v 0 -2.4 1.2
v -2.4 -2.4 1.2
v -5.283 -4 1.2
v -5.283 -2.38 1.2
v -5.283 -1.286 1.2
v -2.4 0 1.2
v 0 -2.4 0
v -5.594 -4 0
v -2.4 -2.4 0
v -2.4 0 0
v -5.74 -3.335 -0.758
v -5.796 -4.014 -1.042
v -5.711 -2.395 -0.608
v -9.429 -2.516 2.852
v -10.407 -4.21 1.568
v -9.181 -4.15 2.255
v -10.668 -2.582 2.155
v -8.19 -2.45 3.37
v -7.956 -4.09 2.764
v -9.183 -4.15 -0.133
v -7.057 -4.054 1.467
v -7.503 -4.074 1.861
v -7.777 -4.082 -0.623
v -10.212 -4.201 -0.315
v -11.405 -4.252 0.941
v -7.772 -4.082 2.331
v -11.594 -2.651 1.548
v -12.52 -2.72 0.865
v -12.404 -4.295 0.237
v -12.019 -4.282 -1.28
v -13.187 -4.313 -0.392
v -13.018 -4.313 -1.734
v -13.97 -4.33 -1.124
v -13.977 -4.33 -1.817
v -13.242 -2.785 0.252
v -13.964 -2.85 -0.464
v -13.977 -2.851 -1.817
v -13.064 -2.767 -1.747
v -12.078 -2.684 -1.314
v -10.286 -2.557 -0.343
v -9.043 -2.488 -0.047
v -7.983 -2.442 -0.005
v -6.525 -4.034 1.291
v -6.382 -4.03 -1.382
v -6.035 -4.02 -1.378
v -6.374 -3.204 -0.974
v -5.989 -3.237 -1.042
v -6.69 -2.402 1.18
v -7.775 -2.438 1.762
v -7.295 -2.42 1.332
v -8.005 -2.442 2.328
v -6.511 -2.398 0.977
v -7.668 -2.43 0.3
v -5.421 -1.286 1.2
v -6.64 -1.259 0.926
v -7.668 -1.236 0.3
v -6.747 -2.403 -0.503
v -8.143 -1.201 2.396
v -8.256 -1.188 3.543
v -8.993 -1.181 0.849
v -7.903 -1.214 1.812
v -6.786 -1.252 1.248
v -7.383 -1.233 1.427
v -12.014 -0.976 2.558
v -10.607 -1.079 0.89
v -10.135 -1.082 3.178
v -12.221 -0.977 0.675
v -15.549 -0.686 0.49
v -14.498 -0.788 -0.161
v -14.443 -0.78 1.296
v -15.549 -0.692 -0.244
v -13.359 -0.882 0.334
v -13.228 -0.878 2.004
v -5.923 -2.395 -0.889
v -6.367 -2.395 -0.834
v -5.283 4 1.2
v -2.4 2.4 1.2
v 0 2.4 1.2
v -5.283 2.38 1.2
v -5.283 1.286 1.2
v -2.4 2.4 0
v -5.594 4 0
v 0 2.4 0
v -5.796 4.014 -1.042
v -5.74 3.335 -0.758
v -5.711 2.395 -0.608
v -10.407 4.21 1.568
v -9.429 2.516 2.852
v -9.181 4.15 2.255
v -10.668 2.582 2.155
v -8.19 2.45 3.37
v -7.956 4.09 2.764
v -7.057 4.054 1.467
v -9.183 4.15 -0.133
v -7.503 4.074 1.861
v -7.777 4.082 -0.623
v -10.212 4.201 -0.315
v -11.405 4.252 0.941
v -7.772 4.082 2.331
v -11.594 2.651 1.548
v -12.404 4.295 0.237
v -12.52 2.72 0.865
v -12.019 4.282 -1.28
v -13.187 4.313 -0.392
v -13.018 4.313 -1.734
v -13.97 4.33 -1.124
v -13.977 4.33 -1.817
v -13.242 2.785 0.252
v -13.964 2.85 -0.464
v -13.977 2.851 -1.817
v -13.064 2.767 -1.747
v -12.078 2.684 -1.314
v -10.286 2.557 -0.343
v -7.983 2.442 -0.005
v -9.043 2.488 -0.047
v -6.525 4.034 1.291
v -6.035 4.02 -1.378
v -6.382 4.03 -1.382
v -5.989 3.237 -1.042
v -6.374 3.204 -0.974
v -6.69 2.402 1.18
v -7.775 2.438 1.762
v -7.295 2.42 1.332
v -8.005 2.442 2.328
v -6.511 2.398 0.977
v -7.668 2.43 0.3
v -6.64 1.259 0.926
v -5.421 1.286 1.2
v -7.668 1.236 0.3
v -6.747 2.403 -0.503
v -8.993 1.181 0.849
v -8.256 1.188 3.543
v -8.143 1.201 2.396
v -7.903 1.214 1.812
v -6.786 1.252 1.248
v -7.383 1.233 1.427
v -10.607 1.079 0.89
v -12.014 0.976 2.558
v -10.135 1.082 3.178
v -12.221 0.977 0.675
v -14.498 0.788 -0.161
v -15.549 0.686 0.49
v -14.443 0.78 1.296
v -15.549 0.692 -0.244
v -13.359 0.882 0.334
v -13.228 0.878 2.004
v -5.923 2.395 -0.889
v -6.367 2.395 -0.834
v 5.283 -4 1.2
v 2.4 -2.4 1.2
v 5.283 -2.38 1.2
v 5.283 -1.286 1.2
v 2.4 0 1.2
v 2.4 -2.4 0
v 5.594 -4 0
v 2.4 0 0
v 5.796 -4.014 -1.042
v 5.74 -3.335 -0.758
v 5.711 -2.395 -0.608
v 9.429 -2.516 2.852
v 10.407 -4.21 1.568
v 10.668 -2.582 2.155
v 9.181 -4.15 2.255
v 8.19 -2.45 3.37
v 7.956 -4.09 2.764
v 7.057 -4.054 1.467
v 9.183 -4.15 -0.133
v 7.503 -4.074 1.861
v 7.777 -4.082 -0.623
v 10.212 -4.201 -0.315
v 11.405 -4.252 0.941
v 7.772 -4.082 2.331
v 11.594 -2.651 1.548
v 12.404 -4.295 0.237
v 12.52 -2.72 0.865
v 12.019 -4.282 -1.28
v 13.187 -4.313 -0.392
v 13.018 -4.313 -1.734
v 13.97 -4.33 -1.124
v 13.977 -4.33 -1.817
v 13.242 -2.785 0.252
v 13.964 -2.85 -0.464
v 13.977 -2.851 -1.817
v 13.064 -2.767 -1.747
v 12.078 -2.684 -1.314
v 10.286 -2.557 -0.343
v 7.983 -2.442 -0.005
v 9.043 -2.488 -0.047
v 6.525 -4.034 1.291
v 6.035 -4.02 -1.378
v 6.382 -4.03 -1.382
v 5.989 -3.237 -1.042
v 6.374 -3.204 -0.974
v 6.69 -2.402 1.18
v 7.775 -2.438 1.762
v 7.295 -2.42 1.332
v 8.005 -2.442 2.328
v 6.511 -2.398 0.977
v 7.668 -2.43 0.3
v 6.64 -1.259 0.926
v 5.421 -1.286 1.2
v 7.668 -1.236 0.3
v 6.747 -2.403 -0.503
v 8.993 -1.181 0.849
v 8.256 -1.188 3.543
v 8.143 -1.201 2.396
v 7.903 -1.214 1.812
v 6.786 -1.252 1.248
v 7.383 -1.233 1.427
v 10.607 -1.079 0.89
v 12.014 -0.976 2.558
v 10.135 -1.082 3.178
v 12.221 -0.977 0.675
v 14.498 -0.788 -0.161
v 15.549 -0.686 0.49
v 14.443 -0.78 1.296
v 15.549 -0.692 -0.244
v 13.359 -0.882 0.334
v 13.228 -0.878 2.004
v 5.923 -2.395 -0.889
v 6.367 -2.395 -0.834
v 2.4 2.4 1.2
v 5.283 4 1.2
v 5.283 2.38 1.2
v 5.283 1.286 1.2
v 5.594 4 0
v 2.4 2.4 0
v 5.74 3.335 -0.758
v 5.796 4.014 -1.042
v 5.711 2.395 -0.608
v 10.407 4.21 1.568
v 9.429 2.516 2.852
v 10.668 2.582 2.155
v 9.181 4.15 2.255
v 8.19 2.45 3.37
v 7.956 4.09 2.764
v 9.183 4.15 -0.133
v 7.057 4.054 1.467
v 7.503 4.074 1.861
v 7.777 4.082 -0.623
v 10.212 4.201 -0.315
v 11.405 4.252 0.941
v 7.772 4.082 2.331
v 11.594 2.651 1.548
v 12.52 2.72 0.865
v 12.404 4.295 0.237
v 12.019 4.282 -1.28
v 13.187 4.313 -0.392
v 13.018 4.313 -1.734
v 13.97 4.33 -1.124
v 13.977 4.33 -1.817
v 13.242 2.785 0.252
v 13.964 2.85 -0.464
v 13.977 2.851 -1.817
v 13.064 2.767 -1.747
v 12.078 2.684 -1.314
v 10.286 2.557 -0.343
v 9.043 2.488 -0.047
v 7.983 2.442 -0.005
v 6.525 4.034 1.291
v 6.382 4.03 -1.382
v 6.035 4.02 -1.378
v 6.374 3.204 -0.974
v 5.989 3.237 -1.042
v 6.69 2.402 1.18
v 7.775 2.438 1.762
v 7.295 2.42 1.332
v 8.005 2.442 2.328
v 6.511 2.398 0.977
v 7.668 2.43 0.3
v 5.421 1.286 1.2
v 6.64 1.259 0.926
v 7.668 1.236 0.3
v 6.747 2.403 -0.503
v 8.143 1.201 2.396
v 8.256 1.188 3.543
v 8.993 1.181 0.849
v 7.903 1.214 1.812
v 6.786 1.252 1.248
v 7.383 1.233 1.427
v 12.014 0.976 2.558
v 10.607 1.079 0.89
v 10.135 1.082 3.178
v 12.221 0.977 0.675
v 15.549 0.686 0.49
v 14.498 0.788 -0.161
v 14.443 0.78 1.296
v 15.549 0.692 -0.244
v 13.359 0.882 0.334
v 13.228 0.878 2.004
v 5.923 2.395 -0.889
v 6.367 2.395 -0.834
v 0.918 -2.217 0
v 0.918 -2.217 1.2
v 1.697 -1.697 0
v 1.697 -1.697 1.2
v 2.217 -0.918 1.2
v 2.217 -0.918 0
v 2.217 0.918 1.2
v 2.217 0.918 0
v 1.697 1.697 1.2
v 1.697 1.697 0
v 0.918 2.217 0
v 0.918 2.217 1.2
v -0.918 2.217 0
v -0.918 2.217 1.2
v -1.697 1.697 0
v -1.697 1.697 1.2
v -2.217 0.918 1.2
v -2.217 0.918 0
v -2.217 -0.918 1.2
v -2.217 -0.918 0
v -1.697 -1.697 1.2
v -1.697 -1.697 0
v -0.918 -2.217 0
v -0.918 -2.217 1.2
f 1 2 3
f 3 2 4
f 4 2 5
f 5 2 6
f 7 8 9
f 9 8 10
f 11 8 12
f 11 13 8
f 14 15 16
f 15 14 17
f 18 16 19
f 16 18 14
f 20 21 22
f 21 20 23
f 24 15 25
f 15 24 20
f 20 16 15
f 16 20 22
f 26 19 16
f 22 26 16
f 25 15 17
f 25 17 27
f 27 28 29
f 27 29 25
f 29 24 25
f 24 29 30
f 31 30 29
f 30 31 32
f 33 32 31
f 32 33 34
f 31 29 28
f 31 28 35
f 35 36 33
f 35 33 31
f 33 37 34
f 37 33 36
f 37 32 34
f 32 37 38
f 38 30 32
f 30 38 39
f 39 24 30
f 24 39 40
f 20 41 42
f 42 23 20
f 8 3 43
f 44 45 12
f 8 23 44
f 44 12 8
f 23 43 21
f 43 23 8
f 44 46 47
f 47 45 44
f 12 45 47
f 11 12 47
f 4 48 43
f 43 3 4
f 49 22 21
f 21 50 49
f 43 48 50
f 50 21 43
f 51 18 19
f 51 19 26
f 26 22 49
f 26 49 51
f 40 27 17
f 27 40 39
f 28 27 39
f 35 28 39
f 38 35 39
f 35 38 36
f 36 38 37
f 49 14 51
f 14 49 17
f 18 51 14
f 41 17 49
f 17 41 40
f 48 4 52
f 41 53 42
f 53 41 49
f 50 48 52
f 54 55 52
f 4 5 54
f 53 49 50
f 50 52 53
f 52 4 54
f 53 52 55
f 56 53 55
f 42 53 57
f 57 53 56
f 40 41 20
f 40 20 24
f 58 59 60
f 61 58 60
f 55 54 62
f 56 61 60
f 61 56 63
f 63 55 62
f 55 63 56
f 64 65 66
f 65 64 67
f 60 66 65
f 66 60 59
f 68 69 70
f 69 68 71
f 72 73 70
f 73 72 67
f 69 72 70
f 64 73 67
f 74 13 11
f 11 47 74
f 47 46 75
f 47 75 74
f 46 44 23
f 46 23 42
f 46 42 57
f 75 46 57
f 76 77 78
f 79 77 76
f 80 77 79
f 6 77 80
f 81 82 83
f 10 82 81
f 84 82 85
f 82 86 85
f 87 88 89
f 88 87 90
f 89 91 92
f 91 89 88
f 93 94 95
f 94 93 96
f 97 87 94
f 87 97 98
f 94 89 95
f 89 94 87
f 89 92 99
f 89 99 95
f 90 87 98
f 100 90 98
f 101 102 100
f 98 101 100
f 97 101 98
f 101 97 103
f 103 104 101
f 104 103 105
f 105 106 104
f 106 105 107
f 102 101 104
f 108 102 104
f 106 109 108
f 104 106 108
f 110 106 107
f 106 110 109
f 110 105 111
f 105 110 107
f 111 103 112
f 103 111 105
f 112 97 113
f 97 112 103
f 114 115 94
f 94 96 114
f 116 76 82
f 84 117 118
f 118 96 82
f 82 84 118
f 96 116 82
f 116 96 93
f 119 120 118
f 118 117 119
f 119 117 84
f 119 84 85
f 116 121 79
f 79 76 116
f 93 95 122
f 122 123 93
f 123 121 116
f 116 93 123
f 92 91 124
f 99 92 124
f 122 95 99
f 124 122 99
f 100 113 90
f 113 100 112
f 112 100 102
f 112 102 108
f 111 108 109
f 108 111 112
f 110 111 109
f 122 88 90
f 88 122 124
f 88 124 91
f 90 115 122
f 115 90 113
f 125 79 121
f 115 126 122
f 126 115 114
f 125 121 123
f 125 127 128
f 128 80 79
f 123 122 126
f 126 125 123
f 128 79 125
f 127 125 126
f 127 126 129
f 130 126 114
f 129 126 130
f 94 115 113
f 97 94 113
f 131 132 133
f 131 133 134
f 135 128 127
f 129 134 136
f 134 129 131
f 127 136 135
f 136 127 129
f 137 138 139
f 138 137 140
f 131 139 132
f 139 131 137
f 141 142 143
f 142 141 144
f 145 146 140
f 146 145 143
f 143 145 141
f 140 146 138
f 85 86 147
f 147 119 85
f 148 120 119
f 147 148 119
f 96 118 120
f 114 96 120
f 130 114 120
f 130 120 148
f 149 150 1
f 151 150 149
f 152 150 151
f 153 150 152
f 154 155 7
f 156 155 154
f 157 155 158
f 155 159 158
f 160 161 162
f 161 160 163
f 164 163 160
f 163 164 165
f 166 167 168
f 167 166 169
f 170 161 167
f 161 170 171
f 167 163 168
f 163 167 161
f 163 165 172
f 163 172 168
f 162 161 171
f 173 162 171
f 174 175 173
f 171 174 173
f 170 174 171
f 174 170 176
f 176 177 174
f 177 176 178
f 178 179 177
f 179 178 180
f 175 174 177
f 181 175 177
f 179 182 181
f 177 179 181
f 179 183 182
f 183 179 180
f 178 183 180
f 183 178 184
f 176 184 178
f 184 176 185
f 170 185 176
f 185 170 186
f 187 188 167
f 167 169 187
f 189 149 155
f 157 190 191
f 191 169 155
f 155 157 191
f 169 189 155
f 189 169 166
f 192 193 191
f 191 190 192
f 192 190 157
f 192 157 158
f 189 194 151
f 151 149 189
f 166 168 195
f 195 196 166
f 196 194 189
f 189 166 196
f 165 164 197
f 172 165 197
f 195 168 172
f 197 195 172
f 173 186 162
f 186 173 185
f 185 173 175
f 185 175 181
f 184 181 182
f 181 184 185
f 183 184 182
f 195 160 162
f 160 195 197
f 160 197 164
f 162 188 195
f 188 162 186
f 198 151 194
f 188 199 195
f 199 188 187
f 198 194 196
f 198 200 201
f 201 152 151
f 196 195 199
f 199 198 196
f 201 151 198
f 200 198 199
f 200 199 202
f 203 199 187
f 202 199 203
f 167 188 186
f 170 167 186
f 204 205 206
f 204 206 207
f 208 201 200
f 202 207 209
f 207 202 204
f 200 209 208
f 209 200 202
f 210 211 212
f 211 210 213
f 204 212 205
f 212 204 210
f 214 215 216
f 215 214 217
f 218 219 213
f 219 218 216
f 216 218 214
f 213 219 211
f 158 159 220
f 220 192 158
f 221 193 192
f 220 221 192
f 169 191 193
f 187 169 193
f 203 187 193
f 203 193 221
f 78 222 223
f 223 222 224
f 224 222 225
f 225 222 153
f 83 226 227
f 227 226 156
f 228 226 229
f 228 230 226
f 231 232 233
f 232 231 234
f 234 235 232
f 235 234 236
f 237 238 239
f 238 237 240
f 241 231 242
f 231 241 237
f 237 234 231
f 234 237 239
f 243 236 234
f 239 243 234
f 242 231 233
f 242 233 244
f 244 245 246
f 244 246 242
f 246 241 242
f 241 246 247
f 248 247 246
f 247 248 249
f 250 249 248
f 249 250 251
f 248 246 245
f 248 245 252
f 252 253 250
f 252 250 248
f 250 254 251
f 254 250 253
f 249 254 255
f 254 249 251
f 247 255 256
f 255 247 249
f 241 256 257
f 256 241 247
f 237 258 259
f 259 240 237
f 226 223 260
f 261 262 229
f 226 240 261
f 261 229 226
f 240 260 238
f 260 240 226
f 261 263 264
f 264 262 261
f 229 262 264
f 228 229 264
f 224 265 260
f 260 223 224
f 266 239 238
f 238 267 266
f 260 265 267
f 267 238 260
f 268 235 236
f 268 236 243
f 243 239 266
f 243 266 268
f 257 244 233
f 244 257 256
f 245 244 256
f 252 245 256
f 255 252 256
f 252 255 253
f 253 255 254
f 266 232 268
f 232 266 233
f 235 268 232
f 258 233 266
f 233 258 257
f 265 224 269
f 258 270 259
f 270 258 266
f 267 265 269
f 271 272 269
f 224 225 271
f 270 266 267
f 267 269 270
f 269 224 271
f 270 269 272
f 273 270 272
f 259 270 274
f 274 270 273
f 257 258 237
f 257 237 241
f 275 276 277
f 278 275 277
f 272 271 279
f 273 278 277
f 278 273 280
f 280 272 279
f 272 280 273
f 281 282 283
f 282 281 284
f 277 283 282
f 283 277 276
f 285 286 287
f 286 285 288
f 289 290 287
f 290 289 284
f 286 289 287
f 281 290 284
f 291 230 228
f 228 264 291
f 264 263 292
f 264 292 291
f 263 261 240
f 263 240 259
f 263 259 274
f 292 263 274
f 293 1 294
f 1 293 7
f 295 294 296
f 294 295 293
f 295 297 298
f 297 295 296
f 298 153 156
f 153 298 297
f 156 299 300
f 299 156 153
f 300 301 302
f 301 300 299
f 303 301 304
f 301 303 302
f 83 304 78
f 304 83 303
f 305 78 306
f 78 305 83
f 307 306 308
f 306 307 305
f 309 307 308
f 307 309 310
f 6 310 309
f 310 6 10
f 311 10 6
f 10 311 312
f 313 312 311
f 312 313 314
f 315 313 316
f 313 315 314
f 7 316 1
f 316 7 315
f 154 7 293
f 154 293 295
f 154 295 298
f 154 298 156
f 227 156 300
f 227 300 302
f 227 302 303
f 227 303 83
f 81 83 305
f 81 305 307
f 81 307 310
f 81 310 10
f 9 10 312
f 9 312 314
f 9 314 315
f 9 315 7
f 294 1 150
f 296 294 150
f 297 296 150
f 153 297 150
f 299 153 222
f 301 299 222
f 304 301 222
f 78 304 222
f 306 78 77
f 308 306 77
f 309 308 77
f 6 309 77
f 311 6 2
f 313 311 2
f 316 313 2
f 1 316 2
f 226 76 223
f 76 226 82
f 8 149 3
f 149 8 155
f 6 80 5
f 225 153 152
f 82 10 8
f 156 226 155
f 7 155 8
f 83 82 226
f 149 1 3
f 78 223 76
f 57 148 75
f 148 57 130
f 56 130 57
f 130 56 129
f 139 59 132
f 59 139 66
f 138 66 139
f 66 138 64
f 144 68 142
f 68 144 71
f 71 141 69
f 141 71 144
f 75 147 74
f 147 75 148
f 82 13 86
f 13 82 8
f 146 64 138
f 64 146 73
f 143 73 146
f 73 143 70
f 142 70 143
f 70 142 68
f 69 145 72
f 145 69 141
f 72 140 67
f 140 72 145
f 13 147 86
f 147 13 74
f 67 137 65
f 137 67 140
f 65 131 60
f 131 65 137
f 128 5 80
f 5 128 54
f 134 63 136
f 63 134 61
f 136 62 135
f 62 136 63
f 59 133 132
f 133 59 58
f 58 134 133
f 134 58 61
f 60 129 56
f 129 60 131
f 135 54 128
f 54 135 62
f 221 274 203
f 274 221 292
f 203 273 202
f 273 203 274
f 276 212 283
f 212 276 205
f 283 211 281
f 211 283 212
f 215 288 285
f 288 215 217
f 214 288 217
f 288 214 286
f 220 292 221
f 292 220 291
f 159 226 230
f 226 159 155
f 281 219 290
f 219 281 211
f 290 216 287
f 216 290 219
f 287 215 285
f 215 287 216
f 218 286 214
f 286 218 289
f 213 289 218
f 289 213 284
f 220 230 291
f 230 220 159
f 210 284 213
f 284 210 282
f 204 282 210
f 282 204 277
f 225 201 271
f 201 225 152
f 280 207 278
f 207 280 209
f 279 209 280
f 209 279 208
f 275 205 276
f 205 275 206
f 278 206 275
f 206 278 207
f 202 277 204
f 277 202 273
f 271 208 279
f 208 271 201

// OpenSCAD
use <../lib.scad>
use <../p/4-4cylo.scad>
use <../p/4-4ndis.scad>
use <../p/recte4.scad>
use <s/12618s01.scad>
$fa=1; $fs=0.2;
function ldraw_lib__12618(realsolid=false) = [
// 0 Minifig Armour Shoulder Pads with Six Spikes
// 0 Name: 12618.dat
// 0 Author: Gerald Lasser [GeraldLasser]
// 0 !LDRAW_ORG Part UPDATE 2023-01
// 0 !LICENSE Licensed under CC BY 2.0 and CC BY 4.0 : see CAreadme.txt
// 
// 0 BFC CERTIFY CCW
  [0,"BFC","CERTIFY"],
  [0,"BFC","CCW"],
// 
// 0 !CATEGORY Minifig Neckwear
// 
// 0 !HISTORY 2013-08-14 {LEGO Digital Designer} Original part shape
// 0 !HISTORY 2020-04-29 [GeraldLasser] File preparation for LDraw Parts Tracker
// 0 !HISTORY 2023-03-05 [OrionP] Official Update 2023-01
// 
// 
// 1 16 0 0 0 1 0 0 0 1 0 0 0 1 s\12618s01.dat
  [1,16,0,0,0,1,0,0,0,1,0,0,0,1, ldraw_lib__s__12618s01(realsolid)],
// 1 16 0 0 0 1 0 0 0 1 0 0 0 -1 s\12618s01.dat
  [1,16,0,0,0,1,0,0,0,1,0,0,0,-1, ldraw_lib__s__12618s01(realsolid)],
// 1 16 0 0 0 -1 0 0 0 1 0 0 0 1 s\12618s01.dat
  [1,16,0,0,0,-1,0,0,0,1,0,0,0,1, ldraw_lib__s__12618s01(realsolid)],
// 1 16 0 0 0 -1 0 0 0 1 0 0 0 -1 s\12618s01.dat
  [1,16,0,0,0,-1,0,0,0,1,0,0,0,-1, ldraw_lib__s__12618s01(realsolid)],
// 
// 0 // Neck
// 0 BFC INVERTNEXT
  [0,"BFC","INVERTNEXT"],
// 1 16 0 0 0 0 0 6 0 -3 0 -6 0 0 4-4cylo.dat
  [1,16,0,0,0,0,0,6,0,-3,0,-6,0,0, ldraw_lib__4_4cylo(realsolid)],
// 1 16 0 0 0 0 0 6 0 -1 0 -6 0 0 4-4ndis.dat
  [1,16,0,0,0,0,0,6,0,-1,0,-6,0,0, ldraw_lib__4_4ndis(realsolid)],
// 1 16 0 -3 0 0 0 6 0 1 0 -6 0 0 4-4ndis.dat
  [1,16,0,-3,0,0,0,6,0,1,0,-6,0,0, ldraw_lib__4_4ndis(realsolid)],
// 
// 1 16 0 0 0 0 0 13.985 0 -1 0 10 0 0 recte4.dat
  [1,16,0,0,0,0,0,13.985,0,-1,0,10,0,0, ldraw_lib__recte4(realsolid)],
// 4 16 -13.985 0 10 -13.207 -3 10 13.207 -3 10 13.985 0 10
  [4,16,-13.985,0,10,-13.207,-3,10,13.207,-3,10,13.985,0,10],
// 4 16 -13.207 -3 -10 -13.985 0 -10 13.985 0 -10 13.207 -3 -10
  [4,16,-13.207,-3,-10,-13.985,0,-10,13.985,0,-10,13.207,-3,-10],
// 2 24 -13.207 -3 10 13.207 -3 10
  [2,24,-13.207,-3,10,13.207,-3,10],
// 2 24 -13.207 -3 -10 13.207 -3 -10
  [2,24,-13.207,-3,-10,13.207,-3,-10],
// 3 16 -6 -3 0 -13.207 -3 3.216 -13.207 -3 -3.216
  [3,16,-6,-3,0,-13.207,-3,3.216,-13.207,-3,-3.216],
// 3 16 13.207 -3 3.216 6 -3 0 13.207 -3 -3.216
  [3,16,13.207,-3,3.216,6,-3,0,13.207,-3,-3.216],
// 3 16 -13.985 0 10 -6 0 0 -13.985 0 -10
  [3,16,-13.985,0,10,-6,0,0,-13.985,0,-10],
// 3 16 6 0 0 13.985 0 10 13.985 0 -10
  [3,16,6,0,0,13.985,0,10,13.985,0,-10],
// 3 16 0 0 -6 13.985 0 -10 -13.985 0 -10
  [3,16,0,0,-6,13.985,0,-10,-13.985,0,-10],
// 3 16 0 0 6 -13.985 0 10 13.985 0 10
  [3,16,0,0,6,-13.985,0,10,13.985,0,10],
// 3 16 13.207 -3 -10 0 -3 -6 -13.207 -3 -10
  [3,16,13.207,-3,-10,0,-3,-6,-13.207,-3,-10],
// 3 16 0 -3 6 13.207 -3 10 -13.207 -3 10
  [3,16,0,-3,6,13.207,-3,10,-13.207,-3,10],
// 
// 0 // Left
// 4 16 -16.867 1.257 6.008 -15.917 2.084 5.987 -15.917 2.084 -5.987 -16.867 1.257 -6.008
  [4,16,-16.867,1.257,6.008,-15.917,2.084,5.987,-15.917,2.084,-5.987,-16.867,1.257,-6.008],
// 4 16 -16.867 1.257 -6.008 -19.17 -.75 -3.09 -19.17 -.75 3.09 -16.867 1.257 6.008
  [4,16,-16.867,1.257,-6.008,-19.17,-.75,-3.09,-19.17,-.75,3.09,-16.867,1.257,6.008],
// 4 16 -25.337 -7.946 2.706 -25.337 -7.946 -2.706 -20.639 -8.858 -2.971 -20.639 -8.858 2.971
  [4,16,-25.337,-7.946,2.706,-25.337,-7.946,-2.706,-20.639,-8.858,-2.971,-20.639,-8.858,2.971],
// 4 16 -30.035 -6.394 2.441 -30.035 -6.394 -2.441 -25.337 -7.946 -2.706 -25.337 -7.946 2.706
  [4,16,-30.035,-6.394,2.441,-30.035,-6.394,-2.441,-25.337,-7.946,-2.706,-25.337,-7.946,2.706],
// 4 16 -38.873 -1.224 1.714 -38.873 .611 1.73 -38.873 .611 -1.73 -38.873 -1.224 -1.714
  [4,16,-38.873,-1.224,1.714,-38.873,.611,1.73,-38.873,.611,-1.73,-38.873,-1.224,-1.714],
// 4 16 -38.873 .611 1.73 -36.245 .402 1.97 -36.245 .402 -1.97 -38.873 .611 -1.73
  [4,16,-38.873,.611,1.73,-36.245,.402,1.97,-36.245,.402,-1.97,-38.873,.611,-1.73],
// 4 16 -15.917 2.084 5.987 -14.808 2.222 5.987 -14.808 2.222 -5.987 -15.917 2.084 -5.987
  [4,16,-15.917,2.084,5.987,-14.808,2.222,5.987,-14.808,2.222,-5.987,-15.917,2.084,-5.987],
// 4 16 -13.985 0 -10 -14.278 1.519 -5.987 -14.278 1.519 5.987 -13.985 0 10
  [4,16,-13.985,0,-10,-14.278,1.519,-5.987,-14.278,1.519,5.987,-13.985,0,10],
// 4 16 -30.035 -6.394 2.441 -33.071 -5.009 2.1955 -33.071 -5.009 -2.1955 -30.035 -6.394 -2.441
  [4,16,-30.035,-6.394,2.441,-33.071,-5.009,2.1955,-33.071,-5.009,-2.1955,-30.035,-6.394,-2.441],
// 4 16 -33.071 -5.009 2.1955 -36.107 -3.24 1.95 -36.107 -3.24 -1.95 -33.071 -5.009 -2.1955
  [4,16,-33.071,-5.009,2.1955,-36.107,-3.24,1.95,-36.107,-3.24,-1.95,-33.071,-5.009,-2.1955],
// 4 16 -36.107 -3.24 1.95 -38.873 -1.224 1.714 -38.873 -1.224 -1.714 -36.107 -3.24 -1.95
  [4,16,-36.107,-3.24,1.95,-38.873,-1.224,1.714,-38.873,-1.224,-1.714,-36.107,-3.24,-1.95],
// 4 16 -36.245 .402 1.97 -33.3985 -.835 2.206 -33.3985 -.835 -2.206 -36.245 .402 -1.97
  [4,16,-36.245,.402,1.97,-33.3985,-.835,2.206,-33.3985,-.835,-2.206,-36.245,.402,-1.97],
// 4 16 -33.3985 -.835 2.206 -30.552 -1.688 2.442 -30.552 -1.688 -2.442 -33.3985 -.835 -2.206
  [4,16,-33.3985,-.835,2.206,-30.552,-1.688,2.442,-30.552,-1.688,-2.442,-33.3985,-.835,-2.206],
// 4 16 -14.808 2.222 5.987 -14.278 1.519 5.987 -14.278 1.519 -5.987 -14.808 2.222 -5.987
  [4,16,-14.808,2.222,5.987,-14.278,1.519,5.987,-14.278,1.519,-5.987,-14.808,2.222,-5.987],
// 4 16 -30.552 -1.688 2.442 -26.517 -2.225 2.697 -26.517 -2.225 -2.697 -30.552 -1.688 -2.442
  [4,16,-30.552,-1.688,2.442,-26.517,-2.225,2.697,-26.517,-2.225,-2.697,-30.552,-1.688,-2.442],
// 4 16 -26.517 -2.225 2.697 -22.482 -2.122 2.952 -22.482 -2.122 -2.952 -26.517 -2.225 -2.697
  [4,16,-26.517,-2.225,2.697,-22.482,-2.122,2.952,-22.482,-2.122,-2.952,-26.517,-2.225,-2.697],
// 4 16 -13.553 -3 -3.216 -13.207 -3 -3.216 -13.207 -3 3.216 -13.553 -3 3.216
  [4,16,-13.553,-3,-3.216,-13.207,-3,-3.216,-13.207,-3,3.216,-13.553,-3,3.216],
// 4 16 -19.758 -4.53 -3.034 -18.458 -3.5685 -3.082 -18.458 -3.5685 3.082 -19.758 -4.53 3.034
  [4,16,-19.758,-4.53,-3.034,-18.458,-3.5685,-3.082,-18.458,-3.5685,3.082,-19.758,-4.53,3.034],
// 4 16 -18.458 -3.5685 -3.082 -16.966 -3.119 -3.13 -16.966 -3.119 3.13 -18.458 -3.5685 3.082
  [4,16,-18.458,-3.5685,-3.082,-16.966,-3.119,-3.13,-16.966,-3.119,3.13,-18.458,-3.5685,3.082],
// 4 16 -20.3585 -5.99 -3.0025 -20.3585 -5.99 3.0025 -20.639 -8.858 2.971 -20.639 -8.858 -2.971
  [4,16,-20.3585,-5.99,-3.0025,-20.3585,-5.99,3.0025,-20.639,-8.858,2.971,-20.639,-8.858,-2.971],
// 4 16 -19.758 -4.53 -3.034 -19.758 -4.53 3.034 -20.3585 -5.99 3.0025 -20.3585 -5.99 -3.0025
  [4,16,-19.758,-4.53,-3.034,-19.758,-4.53,3.034,-20.3585,-5.99,3.0025,-20.3585,-5.99,-3.0025],
// 4 16 -19.17 -.75 3.09 -19.17 -.75 -3.09 -22.482 -2.122 -2.952 -22.482 -2.122 2.952
  [4,16,-19.17,-.75,3.09,-19.17,-.75,-3.09,-22.482,-2.122,-2.952,-22.482,-2.122,2.952],
// 4 16 -13.553 -3 -3.216 -13.553 -3 3.216 -16.966 -3.119 3.13 -16.966 -3.119 -3.13
  [4,16,-13.553,-3,-3.216,-13.553,-3,3.216,-16.966,-3.119,3.13,-16.966,-3.119,-3.13],
// 
// 2 24 -38.873 .611 1.73 -38.873 .611 -1.73
  [2,24,-38.873,.611,1.73,-38.873,.611,-1.73],
// 2 24 -38.873 -1.224 1.714 -38.873 -1.224 -1.714
  [2,24,-38.873,-1.224,1.714,-38.873,-1.224,-1.714],
// 2 24 -20.639 -8.858 -2.971 -20.639 -8.858 2.971
  [2,24,-20.639,-8.858,-2.971,-20.639,-8.858,2.971],
// 
// 5 24 -14.808 2.222 5.987 -14.808 2.222 -5.987 -14.278 1.519 -5.987 -15.917 2.084 -5.987
  [5,24,-14.808,2.222,5.987,-14.808,2.222,-5.987,-14.278,1.519,-5.987,-15.917,2.084,-5.987],
// 5 24 -14.278 1.519 -5.987 -14.278 1.519 5.987 -13.985 0 10 -14.808 2.222 -5.987
  [5,24,-14.278,1.519,-5.987,-14.278,1.519,5.987,-13.985,0,10,-14.808,2.222,-5.987],
// 5 24 -30.035 -6.394 -2.441 -30.035 -6.394 2.441 -33.071 -5.009 2.1955 -25.337 -7.946 -2.706
  [5,24,-30.035,-6.394,-2.441,-30.035,-6.394,2.441,-33.071,-5.009,2.1955,-25.337,-7.946,-2.706],
// 5 24 -19.758 -4.53 -3.034 -19.758 -4.53 3.034 -18.458 -3.5685 -3.082 -20.3585 -5.99 3.0025
  [5,24,-19.758,-4.53,-3.034,-19.758,-4.53,3.034,-18.458,-3.5685,-3.082,-20.3585,-5.99,3.0025],
// 5 24 -18.458 -3.5685 -3.082 -18.458 -3.5685 3.082 -19.758 -4.53 3.034 -16.966 -3.119 -3.13
  [5,24,-18.458,-3.5685,-3.082,-18.458,-3.5685,3.082,-19.758,-4.53,3.034,-16.966,-3.119,-3.13],
// 5 24 -25.337 -7.946 2.706 -25.337 -7.946 -2.706 -30.035 -6.394 2.441 -20.639 -8.858 -2.971
  [5,24,-25.337,-7.946,2.706,-25.337,-7.946,-2.706,-30.035,-6.394,2.441,-20.639,-8.858,-2.971],
// 5 24 -26.517 -2.225 2.697 -26.517 -2.225 -2.697 -30.552 -1.688 -2.442 -22.482 -2.122 2.952
  [5,24,-26.517,-2.225,2.697,-26.517,-2.225,-2.697,-30.552,-1.688,-2.442,-22.482,-2.122,2.952],
// 5 24 -36.107 -3.24 1.95 -36.107 -3.24 -1.95 -33.071 -5.009 -2.1955 -38.873 -1.224 1.714
  [5,24,-36.107,-3.24,1.95,-36.107,-3.24,-1.95,-33.071,-5.009,-2.1955,-38.873,-1.224,1.714],
// 5 24 -19.17 -.75 -3.09 -19.17 -.75 3.09 -16.867 1.257 6.008 -22.482 -2.122 -2.952
  [5,24,-19.17,-.75,-3.09,-19.17,-.75,3.09,-16.867,1.257,6.008,-22.482,-2.122,-2.952],
// 5 24 -33.3985 -.835 2.206 -33.3985 -.835 -2.206 -30.552 -1.688 2.442 -36.245 .402 -1.97
  [5,24,-33.3985,-.835,2.206,-33.3985,-.835,-2.206,-30.552,-1.688,2.442,-36.245,.402,-1.97],
// 5 24 -36.245 .402 -1.97 -36.245 .402 1.97 -33.3985 -.835 2.206 -38.873 .611 -1.73
  [5,24,-36.245,.402,-1.97,-36.245,.402,1.97,-33.3985,-.835,2.206,-38.873,.611,-1.73],
// 5 24 -33.071 -5.009 2.1955 -33.071 -5.009 -2.1955 -36.107 -3.24 1.95 -30.035 -6.394 -2.441
  [5,24,-33.071,-5.009,2.1955,-33.071,-5.009,-2.1955,-36.107,-3.24,1.95,-30.035,-6.394,-2.441],
// 5 24 -15.917 2.084 -5.987 -15.917 2.084 5.987 -16.867 1.257 -6.008 -14.808 2.222 5.987
  [5,24,-15.917,2.084,-5.987,-15.917,2.084,5.987,-16.867,1.257,-6.008,-14.808,2.222,5.987],
// 5 24 -22.482 -2.122 2.952 -22.482 -2.122 -2.952 -26.517 -2.225 -2.697 -19.17 -.75 3.09
  [5,24,-22.482,-2.122,2.952,-22.482,-2.122,-2.952,-26.517,-2.225,-2.697,-19.17,-.75,3.09],
// 5 24 -30.552 -1.688 2.442 -30.552 -1.688 -2.442 -33.3985 -.835 -2.206 -26.517 -2.225 2.697
  [5,24,-30.552,-1.688,2.442,-30.552,-1.688,-2.442,-33.3985,-.835,-2.206,-26.517,-2.225,2.697],
// 5 24 -20.3585 -5.99 3.0025 -20.3585 -5.99 -3.0025 -20.639 -8.858 2.971 -19.758 -4.53 -3.034
  [5,24,-20.3585,-5.99,3.0025,-20.3585,-5.99,-3.0025,-20.639,-8.858,2.971,-19.758,-4.53,-3.034],
// 5 24 -16.966 -3.119 -3.13 -16.966 -3.119 3.13 -18.458 -3.5685 3.082 -13.553 -3 -3.216
  [5,24,-16.966,-3.119,-3.13,-16.966,-3.119,3.13,-18.458,-3.5685,3.082,-13.553,-3,-3.216],
// 5 24 -13.553 -3 3.216 -13.553 -3 -3.216 -13.207 -3 -3.216 -16.966 -3.119 3.13
  [5,24,-13.553,-3,3.216,-13.553,-3,-3.216,-13.207,-3,-3.216,-16.966,-3.119,3.13],
// 
// 0 // Right
// 4 16 15.917 2.084 -5.987 15.917 2.084 5.987 16.867 1.257 6.008 16.867 1.257 -6.008
  [4,16,15.917,2.084,-5.987,15.917,2.084,5.987,16.867,1.257,6.008,16.867,1.257,-6.008],
// 4 16 19.17 -.75 3.09 19.17 -.75 -3.09 16.867 1.257 -6.008 16.867 1.257 6.008
  [4,16,19.17,-.75,3.09,19.17,-.75,-3.09,16.867,1.257,-6.008,16.867,1.257,6.008],
// 4 16 20.639 -8.858 -2.971 25.337 -7.946 -2.706 25.337 -7.946 2.706 20.639 -8.858 2.971
  [4,16,20.639,-8.858,-2.971,25.337,-7.946,-2.706,25.337,-7.946,2.706,20.639,-8.858,2.971],
// 4 16 25.337 -7.946 -2.706 30.035 -6.394 -2.441 30.035 -6.394 2.441 25.337 -7.946 2.706
  [4,16,25.337,-7.946,-2.706,30.035,-6.394,-2.441,30.035,-6.394,2.441,25.337,-7.946,2.706],
// 4 16 38.873 .611 -1.73 38.873 .611 1.73 38.873 -1.224 1.714 38.873 -1.224 -1.714
  [4,16,38.873,.611,-1.73,38.873,.611,1.73,38.873,-1.224,1.714,38.873,-1.224,-1.714],
// 4 16 36.245 .402 -1.97 36.245 .402 1.97 38.873 .611 1.73 38.873 .611 -1.73
  [4,16,36.245,.402,-1.97,36.245,.402,1.97,38.873,.611,1.73,38.873,.611,-1.73],
// 4 16 14.808 2.222 -5.987 14.808 2.222 5.987 15.917 2.084 5.987 15.917 2.084 -5.987
  [4,16,14.808,2.222,-5.987,14.808,2.222,5.987,15.917,2.084,5.987,15.917,2.084,-5.987],
// 4 16 14.278 1.519 5.987 14.278 1.519 -5.987 13.985 0 -10 13.985 0 10
  [4,16,14.278,1.519,5.987,14.278,1.519,-5.987,13.985,0,-10,13.985,0,10],
// 4 16 33.071 -5.009 -2.1955 33.071 -5.009 2.1955 30.035 -6.394 2.441 30.035 -6.394 -2.441
  [4,16,33.071,-5.009,-2.1955,33.071,-5.009,2.1955,30.035,-6.394,2.441,30.035,-6.394,-2.441],
// 4 16 36.107 -3.24 -1.95 36.107 -3.24 1.95 33.071 -5.009 2.1955 33.071 -5.009 -2.1955
  [4,16,36.107,-3.24,-1.95,36.107,-3.24,1.95,33.071,-5.009,2.1955,33.071,-5.009,-2.1955],
// 4 16 38.873 -1.224 -1.714 38.873 -1.224 1.714 36.107 -3.24 1.95 36.107 -3.24 -1.95
  [4,16,38.873,-1.224,-1.714,38.873,-1.224,1.714,36.107,-3.24,1.95,36.107,-3.24,-1.95],
// 4 16 33.3985 -.835 -2.206 33.3985 -.835 2.206 36.245 .402 1.97 36.245 .402 -1.97
  [4,16,33.3985,-.835,-2.206,33.3985,-.835,2.206,36.245,.402,1.97,36.245,.402,-1.97],
// 4 16 30.552 -1.688 -2.442 30.552 -1.688 2.442 33.3985 -.835 2.206 33.3985 -.835 -2.206
  [4,16,30.552,-1.688,-2.442,30.552,-1.688,2.442,33.3985,-.835,2.206,33.3985,-.835,-2.206],
// 4 16 14.278 1.519 -5.987 14.278 1.519 5.987 14.808 2.222 5.987 14.808 2.222 -5.987
  [4,16,14.278,1.519,-5.987,14.278,1.519,5.987,14.808,2.222,5.987,14.808,2.222,-5.987],
// 4 16 26.517 -2.225 -2.697 26.517 -2.225 2.697 30.552 -1.688 2.442 30.552 -1.688 -2.442
  [4,16,26.517,-2.225,-2.697,26.517,-2.225,2.697,30.552,-1.688,2.442,30.552,-1.688,-2.442],
// 4 16 22.482 -2.122 -2.952 22.482 -2.122 2.952 26.517 -2.225 2.697 26.517 -2.225 -2.697
  [4,16,22.482,-2.122,-2.952,22.482,-2.122,2.952,26.517,-2.225,2.697,26.517,-2.225,-2.697],
// 4 16 13.207 -3 3.216 13.207 -3 -3.216 13.553 -3 -3.216 13.553 -3 3.216
  [4,16,13.207,-3,3.216,13.207,-3,-3.216,13.553,-3,-3.216,13.553,-3,3.216],
// 4 16 18.458 -3.5685 3.082 18.458 -3.5685 -3.082 19.758 -4.53 -3.034 19.758 -4.53 3.034
  [4,16,18.458,-3.5685,3.082,18.458,-3.5685,-3.082,19.758,-4.53,-3.034,19.758,-4.53,3.034],
// 4 16 16.966 -3.119 3.13 16.966 -3.119 -3.13 18.458 -3.5685 -3.082 18.458 -3.5685 3.082
  [4,16,16.966,-3.119,3.13,16.966,-3.119,-3.13,18.458,-3.5685,-3.082,18.458,-3.5685,3.082],
// 4 16 20.639 -8.858 2.971 20.3585 -5.99 3.0025 20.3585 -5.99 -3.0025 20.639 -8.858 -2.971
  [4,16,20.639,-8.858,2.971,20.3585,-5.99,3.0025,20.3585,-5.99,-3.0025,20.639,-8.858,-2.971],
// 4 16 20.3585 -5.99 3.0025 19.758 -4.53 3.034 19.758 -4.53 -3.034 20.3585 -5.99 -3.0025
  [4,16,20.3585,-5.99,3.0025,19.758,-4.53,3.034,19.758,-4.53,-3.034,20.3585,-5.99,-3.0025],
// 4 16 22.482 -2.122 -2.952 19.17 -.75 -3.09 19.17 -.75 3.09 22.482 -2.122 2.952
  [4,16,22.482,-2.122,-2.952,19.17,-.75,-3.09,19.17,-.75,3.09,22.482,-2.122,2.952],
// 4 16 16.966 -3.119 3.13 13.553 -3 3.216 13.553 -3 -3.216 16.966 -3.119 -3.13
  [4,16,16.966,-3.119,3.13,13.553,-3,3.216,13.553,-3,-3.216,16.966,-3.119,-3.13],
// 
// 2 24 38.873 .611 1.73 38.873 .611 -1.73
  [2,24,38.873,.611,1.73,38.873,.611,-1.73],
// 2 24 38.873 -1.224 1.714 38.873 -1.224 -1.714
  [2,24,38.873,-1.224,1.714,38.873,-1.224,-1.714],
// 2 24 20.639 -8.858 -2.971 20.639 -8.858 2.971
  [2,24,20.639,-8.858,-2.971,20.639,-8.858,2.971],
// 
// 5 24 14.808 2.222 5.987 14.808 2.222 -5.987 14.278 1.519 -5.987 15.917 2.084 -5.987
  [5,24,14.808,2.222,5.987,14.808,2.222,-5.987,14.278,1.519,-5.987,15.917,2.084,-5.987],
// 5 24 14.278 1.519 -5.987 14.278 1.519 5.987 13.985 0 10 14.808 2.222 -5.987
  [5,24,14.278,1.519,-5.987,14.278,1.519,5.987,13.985,0,10,14.808,2.222,-5.987],
// 5 24 30.035 -6.394 -2.441 30.035 -6.394 2.441 33.071 -5.009 2.1955 25.337 -7.946 -2.706
  [5,24,30.035,-6.394,-2.441,30.035,-6.394,2.441,33.071,-5.009,2.1955,25.337,-7.946,-2.706],
// 5 24 19.758 -4.53 -3.034 19.758 -4.53 3.034 18.458 -3.5685 -3.082 20.3585 -5.99 3.0025
  [5,24,19.758,-4.53,-3.034,19.758,-4.53,3.034,18.458,-3.5685,-3.082,20.3585,-5.99,3.0025],
// 5 24 18.458 -3.5685 -3.082 18.458 -3.5685 3.082 19.758 -4.53 3.034 16.966 -3.119 -3.13
  [5,24,18.458,-3.5685,-3.082,18.458,-3.5685,3.082,19.758,-4.53,3.034,16.966,-3.119,-3.13],
// 5 24 25.337 -7.946 2.706 25.337 -7.946 -2.706 30.035 -6.394 2.441 20.639 -8.858 -2.971
  [5,24,25.337,-7.946,2.706,25.337,-7.946,-2.706,30.035,-6.394,2.441,20.639,-8.858,-2.971],
// 5 24 26.517 -2.225 2.697 26.517 -2.225 -2.697 30.552 -1.688 -2.442 22.482 -2.122 2.952
  [5,24,26.517,-2.225,2.697,26.517,-2.225,-2.697,30.552,-1.688,-2.442,22.482,-2.122,2.952],
// 5 24 36.107 -3.24 1.95 36.107 -3.24 -1.95 33.071 -5.009 -2.1955 38.873 -1.224 1.714
  [5,24,36.107,-3.24,1.95,36.107,-3.24,-1.95,33.071,-5.009,-2.1955,38.873,-1.224,1.714],
// 5 24 19.17 -.75 -3.09 19.17 -.75 3.09 16.867 1.257 6.008 22.482 -2.122 -2.952
  [5,24,19.17,-.75,-3.09,19.17,-.75,3.09,16.867,1.257,6.008,22.482,-2.122,-2.952],
// 5 24 33.3985 -.835 2.206 33.3985 -.835 -2.206 30.552 -1.688 2.442 36.245 .402 -1.97
  [5,24,33.3985,-.835,2.206,33.3985,-.835,-2.206,30.552,-1.688,2.442,36.245,.402,-1.97],
// 5 24 36.245 .402 -1.97 36.245 .402 1.97 33.3985 -.835 2.206 38.873 .611 -1.73
  [5,24,36.245,.402,-1.97,36.245,.402,1.97,33.3985,-.835,2.206,38.873,.611,-1.73],
// 5 24 33.071 -5.009 2.1955 33.071 -5.009 -2.1955 36.107 -3.24 1.95 30.035 -6.394 -2.441
  [5,24,33.071,-5.009,2.1955,33.071,-5.009,-2.1955,36.107,-3.24,1.95,30.035,-6.394,-2.441],
// 5 24 15.917 2.084 -5.987 15.917 2.084 5.987 16.867 1.257 -6.008 14.808 2.222 5.987
  [5,24,15.917,2.084,-5.987,15.917,2.084,5.987,16.867,1.257,-6.008,14.808,2.222,5.987],
// 5 24 22.482 -2.122 2.952 22.482 -2.122 -2.952 26.517 -2.225 -2.697 19.17 -.75 3.09
  [5,24,22.482,-2.122,2.952,22.482,-2.122,-2.952,26.517,-2.225,-2.697,19.17,-.75,3.09],
// 5 24 30.552 -1.688 2.442 30.552 -1.688 -2.442 33.3985 -.835 -2.206 26.517 -2.225 2.697
  [5,24,30.552,-1.688,2.442,30.552,-1.688,-2.442,33.3985,-.835,-2.206,26.517,-2.225,2.697],
// 5 24 20.3585 -5.99 3.0025 20.3585 -5.99 -3.0025 20.639 -8.858 2.971 19.758 -4.53 -3.034
  [5,24,20.3585,-5.99,3.0025,20.3585,-5.99,-3.0025,20.639,-8.858,2.971,19.758,-4.53,-3.034],
// 5 24 16.966 -3.119 -3.13 16.966 -3.119 3.13 18.458 -3.5685 3.082 13.553 -3 -3.216
  [5,24,16.966,-3.119,-3.13,16.966,-3.119,3.13,18.458,-3.5685,3.082,13.553,-3,-3.216],
// 5 24 13.553 -3 3.216 13.553 -3 -3.216 13.207 -3 -3.216 16.966 -3.119 3.13
  [5,24,13.553,-3,3.216,13.553,-3,-3.216,13.207,-3,-3.216,16.966,-3.119,3.13],
];
module ldraw_lib__12618(step=0, col=false, unit=2/5, alt=false, line=0.2, solid=!$preview)
    makepoly(ldraw_lib__12618(solid), step=step, col=col, unit=unit, alt=alt, line=line, solid=solid);
ldraw_lib__12618(line=0.2);
